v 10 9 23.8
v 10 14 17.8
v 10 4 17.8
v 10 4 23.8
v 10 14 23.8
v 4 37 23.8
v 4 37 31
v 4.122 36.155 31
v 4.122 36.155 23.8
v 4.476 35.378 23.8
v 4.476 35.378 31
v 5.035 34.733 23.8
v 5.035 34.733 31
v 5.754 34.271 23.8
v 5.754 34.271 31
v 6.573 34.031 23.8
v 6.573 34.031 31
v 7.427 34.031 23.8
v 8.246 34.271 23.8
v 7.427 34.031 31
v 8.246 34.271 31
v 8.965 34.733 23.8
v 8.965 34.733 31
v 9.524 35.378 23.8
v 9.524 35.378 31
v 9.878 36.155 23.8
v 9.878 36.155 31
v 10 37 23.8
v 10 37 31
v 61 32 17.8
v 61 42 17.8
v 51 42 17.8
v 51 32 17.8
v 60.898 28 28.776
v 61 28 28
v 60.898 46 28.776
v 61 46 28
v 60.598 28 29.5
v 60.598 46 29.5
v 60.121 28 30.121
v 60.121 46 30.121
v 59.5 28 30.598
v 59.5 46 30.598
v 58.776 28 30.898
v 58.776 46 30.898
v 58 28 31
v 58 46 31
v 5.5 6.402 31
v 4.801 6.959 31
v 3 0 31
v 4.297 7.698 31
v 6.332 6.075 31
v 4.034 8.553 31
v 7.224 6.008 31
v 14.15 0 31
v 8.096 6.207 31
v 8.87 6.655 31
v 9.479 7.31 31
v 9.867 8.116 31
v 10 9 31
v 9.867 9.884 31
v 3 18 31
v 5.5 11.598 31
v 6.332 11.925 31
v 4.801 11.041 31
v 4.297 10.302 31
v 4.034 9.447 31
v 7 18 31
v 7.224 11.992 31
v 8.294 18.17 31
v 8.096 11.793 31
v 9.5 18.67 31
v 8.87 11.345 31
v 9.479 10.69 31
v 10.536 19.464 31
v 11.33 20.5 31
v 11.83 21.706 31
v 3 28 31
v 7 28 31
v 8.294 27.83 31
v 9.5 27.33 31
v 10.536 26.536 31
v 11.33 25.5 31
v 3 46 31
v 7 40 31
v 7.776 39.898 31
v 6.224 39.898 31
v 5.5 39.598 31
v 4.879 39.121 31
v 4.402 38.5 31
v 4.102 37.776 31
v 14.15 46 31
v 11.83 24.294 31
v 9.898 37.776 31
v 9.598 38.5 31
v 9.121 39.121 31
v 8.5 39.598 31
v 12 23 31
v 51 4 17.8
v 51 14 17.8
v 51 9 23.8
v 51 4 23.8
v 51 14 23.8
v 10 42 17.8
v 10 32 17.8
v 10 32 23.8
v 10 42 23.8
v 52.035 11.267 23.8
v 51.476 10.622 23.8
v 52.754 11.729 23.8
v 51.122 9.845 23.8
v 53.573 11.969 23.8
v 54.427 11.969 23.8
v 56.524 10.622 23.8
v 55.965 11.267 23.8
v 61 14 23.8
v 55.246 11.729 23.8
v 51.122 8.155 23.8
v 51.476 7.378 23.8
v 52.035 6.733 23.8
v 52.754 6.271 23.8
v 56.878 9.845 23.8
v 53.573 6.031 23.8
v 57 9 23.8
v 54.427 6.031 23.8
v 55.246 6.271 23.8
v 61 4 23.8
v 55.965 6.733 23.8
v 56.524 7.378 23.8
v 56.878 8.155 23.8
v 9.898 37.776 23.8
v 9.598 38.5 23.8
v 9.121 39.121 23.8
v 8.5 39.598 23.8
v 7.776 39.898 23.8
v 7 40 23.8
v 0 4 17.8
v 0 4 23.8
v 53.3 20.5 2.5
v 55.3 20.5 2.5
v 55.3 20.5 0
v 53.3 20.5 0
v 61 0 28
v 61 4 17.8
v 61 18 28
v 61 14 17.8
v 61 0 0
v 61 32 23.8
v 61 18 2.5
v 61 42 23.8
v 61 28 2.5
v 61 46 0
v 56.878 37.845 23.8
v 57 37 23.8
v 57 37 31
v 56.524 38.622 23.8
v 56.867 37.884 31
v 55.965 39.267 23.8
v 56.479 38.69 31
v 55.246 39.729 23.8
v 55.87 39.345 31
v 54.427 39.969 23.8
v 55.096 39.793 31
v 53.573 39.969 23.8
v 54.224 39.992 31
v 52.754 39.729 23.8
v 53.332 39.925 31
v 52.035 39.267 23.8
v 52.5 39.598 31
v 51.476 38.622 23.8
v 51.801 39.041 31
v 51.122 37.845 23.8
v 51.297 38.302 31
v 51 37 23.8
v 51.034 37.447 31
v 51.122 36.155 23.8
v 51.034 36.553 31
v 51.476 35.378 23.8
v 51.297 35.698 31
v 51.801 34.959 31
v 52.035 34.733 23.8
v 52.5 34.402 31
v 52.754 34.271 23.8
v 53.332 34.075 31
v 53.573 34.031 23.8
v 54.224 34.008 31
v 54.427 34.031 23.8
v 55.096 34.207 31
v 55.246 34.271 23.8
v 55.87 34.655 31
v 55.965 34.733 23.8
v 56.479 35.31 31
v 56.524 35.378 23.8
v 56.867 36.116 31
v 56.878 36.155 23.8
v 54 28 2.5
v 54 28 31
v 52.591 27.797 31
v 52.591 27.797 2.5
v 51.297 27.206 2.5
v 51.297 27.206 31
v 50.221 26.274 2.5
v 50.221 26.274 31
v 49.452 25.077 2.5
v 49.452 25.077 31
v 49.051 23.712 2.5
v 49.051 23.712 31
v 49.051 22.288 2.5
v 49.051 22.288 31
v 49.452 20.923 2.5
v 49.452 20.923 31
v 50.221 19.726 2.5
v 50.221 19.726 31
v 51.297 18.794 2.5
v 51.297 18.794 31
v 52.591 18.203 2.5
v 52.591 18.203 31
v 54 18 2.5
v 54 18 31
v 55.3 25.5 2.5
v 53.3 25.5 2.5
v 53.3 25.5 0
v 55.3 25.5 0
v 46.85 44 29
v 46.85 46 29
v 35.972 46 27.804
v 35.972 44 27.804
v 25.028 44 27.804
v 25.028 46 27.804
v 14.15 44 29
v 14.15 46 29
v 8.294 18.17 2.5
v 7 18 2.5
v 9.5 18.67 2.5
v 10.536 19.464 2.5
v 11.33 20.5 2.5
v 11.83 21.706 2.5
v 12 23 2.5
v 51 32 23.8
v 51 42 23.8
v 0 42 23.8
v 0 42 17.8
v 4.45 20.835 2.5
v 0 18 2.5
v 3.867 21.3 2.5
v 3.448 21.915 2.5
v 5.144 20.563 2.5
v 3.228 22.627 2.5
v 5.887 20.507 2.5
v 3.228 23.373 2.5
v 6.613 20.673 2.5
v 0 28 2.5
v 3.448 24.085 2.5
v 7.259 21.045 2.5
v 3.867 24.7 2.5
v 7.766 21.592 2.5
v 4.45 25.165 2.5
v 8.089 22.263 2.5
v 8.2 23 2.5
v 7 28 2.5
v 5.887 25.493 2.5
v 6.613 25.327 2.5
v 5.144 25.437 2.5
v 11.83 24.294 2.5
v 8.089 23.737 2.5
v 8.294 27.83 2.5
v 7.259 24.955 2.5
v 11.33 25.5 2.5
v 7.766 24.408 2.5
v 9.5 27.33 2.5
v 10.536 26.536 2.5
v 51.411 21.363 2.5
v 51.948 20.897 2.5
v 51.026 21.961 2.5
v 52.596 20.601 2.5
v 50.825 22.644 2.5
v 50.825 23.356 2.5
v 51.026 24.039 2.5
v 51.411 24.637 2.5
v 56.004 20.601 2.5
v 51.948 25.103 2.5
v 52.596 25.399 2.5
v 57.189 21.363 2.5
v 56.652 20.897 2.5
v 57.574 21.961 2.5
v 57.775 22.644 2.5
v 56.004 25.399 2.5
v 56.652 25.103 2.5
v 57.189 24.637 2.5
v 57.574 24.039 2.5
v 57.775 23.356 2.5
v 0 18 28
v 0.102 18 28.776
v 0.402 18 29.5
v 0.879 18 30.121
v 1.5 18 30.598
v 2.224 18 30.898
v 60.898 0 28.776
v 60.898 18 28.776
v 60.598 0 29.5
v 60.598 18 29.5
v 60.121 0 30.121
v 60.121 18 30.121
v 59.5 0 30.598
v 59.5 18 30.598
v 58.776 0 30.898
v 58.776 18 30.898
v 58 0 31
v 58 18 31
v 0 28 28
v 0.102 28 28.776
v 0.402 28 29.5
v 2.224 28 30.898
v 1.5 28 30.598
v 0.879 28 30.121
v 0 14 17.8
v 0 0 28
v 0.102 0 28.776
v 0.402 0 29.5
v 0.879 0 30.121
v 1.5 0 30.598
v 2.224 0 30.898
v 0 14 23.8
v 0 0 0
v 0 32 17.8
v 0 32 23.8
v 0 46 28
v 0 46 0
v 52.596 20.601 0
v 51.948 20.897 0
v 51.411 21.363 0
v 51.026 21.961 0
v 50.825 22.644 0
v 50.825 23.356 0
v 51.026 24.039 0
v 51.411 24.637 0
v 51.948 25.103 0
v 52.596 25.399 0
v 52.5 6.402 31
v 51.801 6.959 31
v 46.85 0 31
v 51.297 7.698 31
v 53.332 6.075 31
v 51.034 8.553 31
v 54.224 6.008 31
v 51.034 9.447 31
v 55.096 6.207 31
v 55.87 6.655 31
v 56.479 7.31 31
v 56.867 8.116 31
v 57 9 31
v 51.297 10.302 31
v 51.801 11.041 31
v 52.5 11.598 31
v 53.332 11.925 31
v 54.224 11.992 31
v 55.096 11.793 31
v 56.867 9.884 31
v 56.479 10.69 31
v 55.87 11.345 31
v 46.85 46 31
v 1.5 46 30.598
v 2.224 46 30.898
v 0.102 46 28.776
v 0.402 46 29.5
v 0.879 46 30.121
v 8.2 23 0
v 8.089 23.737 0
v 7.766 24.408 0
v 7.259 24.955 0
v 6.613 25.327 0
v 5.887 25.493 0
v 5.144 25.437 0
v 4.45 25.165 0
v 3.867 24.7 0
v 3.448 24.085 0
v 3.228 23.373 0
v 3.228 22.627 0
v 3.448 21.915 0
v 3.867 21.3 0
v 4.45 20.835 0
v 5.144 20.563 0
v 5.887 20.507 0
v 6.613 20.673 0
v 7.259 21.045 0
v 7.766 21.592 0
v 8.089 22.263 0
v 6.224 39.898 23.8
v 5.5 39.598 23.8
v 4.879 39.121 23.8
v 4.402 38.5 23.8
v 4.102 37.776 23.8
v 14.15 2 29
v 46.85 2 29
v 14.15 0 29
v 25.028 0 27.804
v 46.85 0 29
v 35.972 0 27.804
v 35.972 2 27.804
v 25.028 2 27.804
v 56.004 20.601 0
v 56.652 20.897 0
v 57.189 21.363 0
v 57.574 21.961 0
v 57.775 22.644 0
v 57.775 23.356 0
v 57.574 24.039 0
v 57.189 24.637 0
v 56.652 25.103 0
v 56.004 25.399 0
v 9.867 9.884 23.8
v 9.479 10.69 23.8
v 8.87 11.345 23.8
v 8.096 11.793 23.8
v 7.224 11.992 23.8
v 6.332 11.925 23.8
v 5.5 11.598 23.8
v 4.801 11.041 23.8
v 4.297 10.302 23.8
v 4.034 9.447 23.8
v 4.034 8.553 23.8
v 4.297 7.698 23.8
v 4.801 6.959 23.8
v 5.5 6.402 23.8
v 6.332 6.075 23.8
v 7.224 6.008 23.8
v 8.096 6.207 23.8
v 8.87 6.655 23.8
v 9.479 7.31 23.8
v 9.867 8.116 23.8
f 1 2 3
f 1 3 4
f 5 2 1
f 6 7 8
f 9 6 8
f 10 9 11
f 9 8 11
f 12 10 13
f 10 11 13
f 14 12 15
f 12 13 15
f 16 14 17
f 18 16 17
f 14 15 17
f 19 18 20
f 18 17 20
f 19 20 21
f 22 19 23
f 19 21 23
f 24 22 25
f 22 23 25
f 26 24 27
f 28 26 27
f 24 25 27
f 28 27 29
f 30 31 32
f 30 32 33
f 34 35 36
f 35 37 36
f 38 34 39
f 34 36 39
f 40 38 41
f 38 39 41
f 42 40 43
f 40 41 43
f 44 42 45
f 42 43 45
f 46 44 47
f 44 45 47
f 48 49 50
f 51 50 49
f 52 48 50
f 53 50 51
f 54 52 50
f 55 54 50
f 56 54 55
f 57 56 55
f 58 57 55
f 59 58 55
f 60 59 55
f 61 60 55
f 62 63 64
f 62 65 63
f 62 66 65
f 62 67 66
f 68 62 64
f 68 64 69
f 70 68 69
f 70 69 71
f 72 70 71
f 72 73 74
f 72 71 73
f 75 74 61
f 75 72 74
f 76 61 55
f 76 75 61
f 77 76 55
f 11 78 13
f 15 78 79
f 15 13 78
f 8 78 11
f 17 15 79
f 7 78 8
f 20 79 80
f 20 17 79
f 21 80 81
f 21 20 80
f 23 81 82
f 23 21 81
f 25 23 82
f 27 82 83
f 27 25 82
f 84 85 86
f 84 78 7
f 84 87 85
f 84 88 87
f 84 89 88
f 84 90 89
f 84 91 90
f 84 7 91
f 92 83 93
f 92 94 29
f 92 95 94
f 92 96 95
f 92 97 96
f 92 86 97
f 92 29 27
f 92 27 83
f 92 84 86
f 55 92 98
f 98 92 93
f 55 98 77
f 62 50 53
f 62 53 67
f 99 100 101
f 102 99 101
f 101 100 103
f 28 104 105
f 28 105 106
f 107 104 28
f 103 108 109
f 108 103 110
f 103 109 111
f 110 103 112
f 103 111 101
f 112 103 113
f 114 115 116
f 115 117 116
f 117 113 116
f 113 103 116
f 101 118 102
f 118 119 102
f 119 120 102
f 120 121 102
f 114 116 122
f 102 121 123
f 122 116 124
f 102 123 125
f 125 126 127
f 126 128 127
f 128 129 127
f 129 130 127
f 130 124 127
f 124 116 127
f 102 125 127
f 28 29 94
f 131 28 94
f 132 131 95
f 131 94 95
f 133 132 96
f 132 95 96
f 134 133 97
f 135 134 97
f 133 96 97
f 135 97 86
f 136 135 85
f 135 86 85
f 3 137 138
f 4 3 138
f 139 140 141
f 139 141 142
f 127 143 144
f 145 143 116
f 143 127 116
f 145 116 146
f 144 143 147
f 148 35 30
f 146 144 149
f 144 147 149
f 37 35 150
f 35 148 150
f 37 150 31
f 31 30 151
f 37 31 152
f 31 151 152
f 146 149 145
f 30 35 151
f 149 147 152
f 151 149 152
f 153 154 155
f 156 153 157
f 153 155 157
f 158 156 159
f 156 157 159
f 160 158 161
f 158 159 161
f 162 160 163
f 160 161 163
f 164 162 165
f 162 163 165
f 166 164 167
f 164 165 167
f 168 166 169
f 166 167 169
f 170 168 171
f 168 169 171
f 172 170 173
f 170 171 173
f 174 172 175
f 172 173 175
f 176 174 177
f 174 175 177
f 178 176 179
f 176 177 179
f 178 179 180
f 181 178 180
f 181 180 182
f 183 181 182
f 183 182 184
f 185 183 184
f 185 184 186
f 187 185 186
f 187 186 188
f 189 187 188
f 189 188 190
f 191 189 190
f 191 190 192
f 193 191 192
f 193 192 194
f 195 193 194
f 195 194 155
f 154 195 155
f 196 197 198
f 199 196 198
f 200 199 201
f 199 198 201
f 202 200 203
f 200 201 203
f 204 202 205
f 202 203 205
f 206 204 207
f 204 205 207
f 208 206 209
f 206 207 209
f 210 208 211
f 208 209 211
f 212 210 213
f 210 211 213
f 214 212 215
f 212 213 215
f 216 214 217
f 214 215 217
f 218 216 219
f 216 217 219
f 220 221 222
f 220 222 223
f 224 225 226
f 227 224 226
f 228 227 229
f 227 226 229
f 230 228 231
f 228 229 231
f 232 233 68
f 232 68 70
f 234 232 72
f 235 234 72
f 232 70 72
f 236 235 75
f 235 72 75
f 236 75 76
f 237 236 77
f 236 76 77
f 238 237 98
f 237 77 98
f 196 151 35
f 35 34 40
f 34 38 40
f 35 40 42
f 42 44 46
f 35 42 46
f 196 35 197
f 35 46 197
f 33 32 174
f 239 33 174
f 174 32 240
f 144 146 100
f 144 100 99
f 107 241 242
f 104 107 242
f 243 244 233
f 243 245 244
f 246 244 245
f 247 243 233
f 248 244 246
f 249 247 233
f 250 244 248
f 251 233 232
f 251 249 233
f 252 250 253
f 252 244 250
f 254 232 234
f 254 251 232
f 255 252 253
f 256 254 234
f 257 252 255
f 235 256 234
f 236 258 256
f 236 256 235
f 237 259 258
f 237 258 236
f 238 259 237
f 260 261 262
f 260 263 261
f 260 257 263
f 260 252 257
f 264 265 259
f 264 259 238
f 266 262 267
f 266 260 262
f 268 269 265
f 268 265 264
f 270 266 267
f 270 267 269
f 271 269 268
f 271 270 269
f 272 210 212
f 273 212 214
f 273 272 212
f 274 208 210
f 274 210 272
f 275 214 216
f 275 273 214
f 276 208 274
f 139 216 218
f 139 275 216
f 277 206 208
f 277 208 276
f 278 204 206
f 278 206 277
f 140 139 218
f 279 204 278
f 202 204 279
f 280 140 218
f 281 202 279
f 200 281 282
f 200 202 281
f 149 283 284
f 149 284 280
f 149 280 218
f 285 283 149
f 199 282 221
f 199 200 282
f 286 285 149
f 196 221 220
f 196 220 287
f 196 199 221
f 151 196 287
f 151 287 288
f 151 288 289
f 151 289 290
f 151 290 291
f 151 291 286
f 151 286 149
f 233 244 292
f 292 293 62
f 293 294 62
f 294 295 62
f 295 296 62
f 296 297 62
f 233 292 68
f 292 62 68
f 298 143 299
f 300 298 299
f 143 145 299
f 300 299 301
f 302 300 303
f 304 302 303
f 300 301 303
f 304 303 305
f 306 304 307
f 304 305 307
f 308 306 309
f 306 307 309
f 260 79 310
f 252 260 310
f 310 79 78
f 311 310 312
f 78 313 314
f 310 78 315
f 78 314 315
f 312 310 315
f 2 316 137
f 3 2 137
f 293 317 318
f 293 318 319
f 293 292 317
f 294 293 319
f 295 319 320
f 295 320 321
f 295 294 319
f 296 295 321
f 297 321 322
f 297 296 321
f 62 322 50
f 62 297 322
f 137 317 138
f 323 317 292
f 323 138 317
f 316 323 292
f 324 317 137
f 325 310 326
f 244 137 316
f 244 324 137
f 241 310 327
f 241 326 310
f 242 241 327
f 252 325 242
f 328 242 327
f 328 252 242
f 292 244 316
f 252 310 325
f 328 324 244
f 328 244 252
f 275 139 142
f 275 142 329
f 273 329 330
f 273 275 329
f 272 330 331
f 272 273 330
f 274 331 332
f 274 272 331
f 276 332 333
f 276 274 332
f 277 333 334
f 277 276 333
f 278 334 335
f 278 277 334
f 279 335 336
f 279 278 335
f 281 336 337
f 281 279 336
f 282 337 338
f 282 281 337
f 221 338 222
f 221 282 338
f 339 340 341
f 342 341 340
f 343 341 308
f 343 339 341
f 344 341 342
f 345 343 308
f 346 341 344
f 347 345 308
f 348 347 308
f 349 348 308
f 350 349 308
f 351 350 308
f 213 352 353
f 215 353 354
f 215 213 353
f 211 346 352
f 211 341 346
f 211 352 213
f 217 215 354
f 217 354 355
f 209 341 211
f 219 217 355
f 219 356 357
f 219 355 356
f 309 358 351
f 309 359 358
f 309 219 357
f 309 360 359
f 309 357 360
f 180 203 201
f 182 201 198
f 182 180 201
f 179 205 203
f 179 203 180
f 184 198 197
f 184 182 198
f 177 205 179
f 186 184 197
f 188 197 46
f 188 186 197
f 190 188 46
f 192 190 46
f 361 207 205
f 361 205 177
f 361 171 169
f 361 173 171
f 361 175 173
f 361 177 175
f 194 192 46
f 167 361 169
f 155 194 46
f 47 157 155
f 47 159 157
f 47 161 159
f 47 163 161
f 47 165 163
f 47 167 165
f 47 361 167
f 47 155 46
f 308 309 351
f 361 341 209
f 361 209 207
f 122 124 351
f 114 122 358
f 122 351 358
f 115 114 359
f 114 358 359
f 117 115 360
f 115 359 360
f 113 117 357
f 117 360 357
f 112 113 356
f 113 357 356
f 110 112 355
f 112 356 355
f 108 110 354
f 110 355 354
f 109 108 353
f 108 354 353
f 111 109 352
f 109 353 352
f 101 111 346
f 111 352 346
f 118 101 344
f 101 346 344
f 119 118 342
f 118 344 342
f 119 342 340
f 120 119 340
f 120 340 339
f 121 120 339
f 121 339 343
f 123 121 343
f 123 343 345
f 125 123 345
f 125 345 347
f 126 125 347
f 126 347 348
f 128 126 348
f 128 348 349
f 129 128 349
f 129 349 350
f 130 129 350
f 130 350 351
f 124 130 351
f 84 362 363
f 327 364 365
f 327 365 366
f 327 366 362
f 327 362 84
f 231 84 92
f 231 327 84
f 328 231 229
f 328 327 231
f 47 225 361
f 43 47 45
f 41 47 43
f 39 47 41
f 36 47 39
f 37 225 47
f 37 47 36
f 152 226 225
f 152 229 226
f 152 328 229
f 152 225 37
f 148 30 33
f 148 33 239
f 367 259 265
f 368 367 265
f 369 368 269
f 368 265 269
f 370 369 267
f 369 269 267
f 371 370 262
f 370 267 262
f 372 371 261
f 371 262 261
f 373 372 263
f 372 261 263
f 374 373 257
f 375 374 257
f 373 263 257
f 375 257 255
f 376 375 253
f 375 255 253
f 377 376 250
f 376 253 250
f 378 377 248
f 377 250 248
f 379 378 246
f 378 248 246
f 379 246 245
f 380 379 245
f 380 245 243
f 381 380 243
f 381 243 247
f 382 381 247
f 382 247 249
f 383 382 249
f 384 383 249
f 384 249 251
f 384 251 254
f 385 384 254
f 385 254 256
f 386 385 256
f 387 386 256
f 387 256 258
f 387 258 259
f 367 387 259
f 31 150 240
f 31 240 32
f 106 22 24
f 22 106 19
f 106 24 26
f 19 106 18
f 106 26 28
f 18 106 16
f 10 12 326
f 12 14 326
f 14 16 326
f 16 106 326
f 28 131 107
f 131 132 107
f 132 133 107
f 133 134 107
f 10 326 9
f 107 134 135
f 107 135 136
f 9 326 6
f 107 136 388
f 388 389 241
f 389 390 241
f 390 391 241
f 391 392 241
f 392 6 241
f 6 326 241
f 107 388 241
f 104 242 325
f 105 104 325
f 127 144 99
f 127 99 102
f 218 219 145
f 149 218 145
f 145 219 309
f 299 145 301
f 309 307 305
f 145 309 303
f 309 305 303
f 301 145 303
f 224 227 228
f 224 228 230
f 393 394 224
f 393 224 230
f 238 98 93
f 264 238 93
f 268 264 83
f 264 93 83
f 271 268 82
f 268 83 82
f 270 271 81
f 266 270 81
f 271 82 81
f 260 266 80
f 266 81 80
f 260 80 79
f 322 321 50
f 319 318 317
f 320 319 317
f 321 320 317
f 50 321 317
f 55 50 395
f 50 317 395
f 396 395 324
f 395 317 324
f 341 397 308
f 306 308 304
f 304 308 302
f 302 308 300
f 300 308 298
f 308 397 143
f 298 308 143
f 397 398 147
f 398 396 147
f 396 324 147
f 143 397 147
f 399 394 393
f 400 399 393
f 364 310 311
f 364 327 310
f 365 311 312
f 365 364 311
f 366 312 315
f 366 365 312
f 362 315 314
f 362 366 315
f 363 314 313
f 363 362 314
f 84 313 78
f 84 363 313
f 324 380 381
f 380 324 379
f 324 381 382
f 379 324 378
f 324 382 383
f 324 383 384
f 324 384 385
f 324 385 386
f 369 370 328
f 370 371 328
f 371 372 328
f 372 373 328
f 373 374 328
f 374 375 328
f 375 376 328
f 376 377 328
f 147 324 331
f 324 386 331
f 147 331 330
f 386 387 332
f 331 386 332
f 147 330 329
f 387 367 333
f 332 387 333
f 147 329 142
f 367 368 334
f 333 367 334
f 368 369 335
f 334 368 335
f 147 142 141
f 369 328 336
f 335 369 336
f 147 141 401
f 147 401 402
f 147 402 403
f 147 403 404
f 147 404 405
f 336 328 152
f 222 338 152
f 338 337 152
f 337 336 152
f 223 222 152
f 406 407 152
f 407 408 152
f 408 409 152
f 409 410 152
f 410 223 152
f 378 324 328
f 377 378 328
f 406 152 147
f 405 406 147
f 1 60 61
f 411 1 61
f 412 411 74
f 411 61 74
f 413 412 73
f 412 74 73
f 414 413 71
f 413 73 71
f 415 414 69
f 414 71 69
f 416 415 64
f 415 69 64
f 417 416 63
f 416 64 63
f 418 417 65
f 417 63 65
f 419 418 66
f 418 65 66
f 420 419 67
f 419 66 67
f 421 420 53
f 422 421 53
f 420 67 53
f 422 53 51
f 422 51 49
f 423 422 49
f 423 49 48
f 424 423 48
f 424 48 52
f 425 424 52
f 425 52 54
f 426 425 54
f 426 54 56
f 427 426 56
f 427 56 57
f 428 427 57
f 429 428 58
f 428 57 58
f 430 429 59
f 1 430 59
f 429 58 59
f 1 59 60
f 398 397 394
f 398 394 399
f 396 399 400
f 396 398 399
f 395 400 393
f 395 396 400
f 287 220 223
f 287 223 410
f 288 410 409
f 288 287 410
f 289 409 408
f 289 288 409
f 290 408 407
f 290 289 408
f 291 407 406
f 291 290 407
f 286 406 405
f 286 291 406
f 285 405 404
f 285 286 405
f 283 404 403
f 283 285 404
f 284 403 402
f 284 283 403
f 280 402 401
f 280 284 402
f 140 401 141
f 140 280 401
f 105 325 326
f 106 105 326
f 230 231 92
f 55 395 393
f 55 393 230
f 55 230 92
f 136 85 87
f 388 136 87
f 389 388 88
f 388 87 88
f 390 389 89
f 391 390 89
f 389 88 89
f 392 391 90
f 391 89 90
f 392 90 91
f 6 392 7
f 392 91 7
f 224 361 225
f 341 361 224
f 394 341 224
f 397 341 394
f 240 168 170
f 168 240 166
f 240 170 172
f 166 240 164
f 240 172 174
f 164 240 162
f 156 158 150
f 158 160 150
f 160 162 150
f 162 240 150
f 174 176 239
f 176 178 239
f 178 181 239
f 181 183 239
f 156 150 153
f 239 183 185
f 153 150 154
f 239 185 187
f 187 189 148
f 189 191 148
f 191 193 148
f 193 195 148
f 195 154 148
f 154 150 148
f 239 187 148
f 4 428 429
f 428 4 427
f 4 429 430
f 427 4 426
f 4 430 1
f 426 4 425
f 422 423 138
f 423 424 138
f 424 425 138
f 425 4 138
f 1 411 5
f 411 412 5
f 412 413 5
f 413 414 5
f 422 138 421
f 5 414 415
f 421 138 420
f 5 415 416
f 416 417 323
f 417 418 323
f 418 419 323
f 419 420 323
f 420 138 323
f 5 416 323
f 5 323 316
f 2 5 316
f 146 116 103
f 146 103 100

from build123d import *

# Parameters (mm, degrees)
SKETCH_1_W          = 61
SKETCH_1_H          = 46
EXTRUDE_1_DEPTH     = 31
CUT_EXTRUDE_1_DEPTH = 28.5
SKETCH_3_R          = 2.5
CUT_EXTRUDE_2_DEPTH = 28.5
CUT_EXTRUDE_3_DEPTH = 28.5
CUT_EXTRUDE_4_DEPTH = 68.5
CUT_EXTRUDE_5_DEPTH = 2
CUT_EXTRUDE_6_DEPTH = 2
SKETCH_8_R          = 3
CUT_EXTRUDE_7_DEPTH = 7.2
CUT_EXTRUDE_8_DEPTH = 10
CUT_EXTRUDE_9_DEPTH = 10
FILLET_1_R          = 3


with BuildPart() as part:
    # 草图1 → 凸台-拉伸1 (new body)
    with BuildSketch(Plane.XY):
        with Locations((30.5, 23)):
            Rectangle(SKETCH_1_W, SKETCH_1_H)
    extrude(amount=EXTRUDE_1_DEPTH)

    # 草图2 → 切除-拉伸1 (cut)
    with BuildSketch(Plane.XY.offset(31)):
        with BuildLine():
            ThreePointArc((7, 18), (10.535533906, 19.464466094), (12, 23))
            ThreePointArc((12, 23), (10.535533906, 26.535533906), (7, 28))
            Line((7, 28), (0, 28))
            Line((0, 28), (0, 18))
            Line((0, 18), (7, 18))
        make_face()
        with BuildLine():
            Line((61, 18), (61, 28))
            Line((61, 28), (54, 28))
            ThreePointArc((54, 28), (49, 23), (54, 18))
            Line((54, 18), (61, 18))
        make_face()
    extrude(amount=-CUT_EXTRUDE_1_DEPTH, mode=Mode.SUBTRACT)

    # 草图3 → 切除-拉伸2 (cut)
    with BuildSketch(Plane.XY.offset(2.5)):
        with Locations((5.7, 23)):
            Circle(SKETCH_3_R)
    extrude(amount=-CUT_EXTRUDE_2_DEPTH, mode=Mode.SUBTRACT)

    # 草图4 → 切除-拉伸3 (cut)
    with BuildSketch(Plane.XY.offset(2.5)):
        with BuildLine():
            Line((53.3, 25.5), (55.3, 25.5))
            ThreePointArc((55.3, 25.5), (57.8, 23), (55.3, 20.5))
            Line((55.3, 20.5), (53.3, 20.5))
            ThreePointArc((53.3, 20.5), (50.8, 23), (53.3, 25.5))
        make_face()
    extrude(amount=-CUT_EXTRUDE_3_DEPTH, mode=Mode.SUBTRACT)

    # 草图5 → 切除-拉伸4 (cut)
    with BuildSketch(Plane.XZ):
        Polygon((30.5, 31), (46.85, 31), (46.85, 29), (14.15, 29), (14.15, 31), align=None)
    extrude(amount=-CUT_EXTRUDE_4_DEPTH, mode=Mode.SUBTRACT)

    # 草图6 → 切除-拉伸5 (cut)
    with BuildSketch(Plane.XZ):
        with BuildLine():
            Line((14.15, 29), (46.85, 29))
            ThreePointArc((46.85, 29), (30.5, 27.654333407), (14.15, 29))
        make_face()
    extrude(amount=-CUT_EXTRUDE_5_DEPTH, mode=Mode.SUBTRACT)

    # 草图7 → 切除-拉伸6 (cut)
    with BuildSketch(Plane(origin=(0, 46, 0), x_dir=(1, 0, 0), z_dir=(0, 1, 0))):
        with BuildLine():
            Line((14.15, -29), (46.85, -29))
            ThreePointArc((46.85, -29), (30.5, -27.654333407), (14.15, -29))
        make_face()
    extrude(amount=-CUT_EXTRUDE_6_DEPTH, mode=Mode.SUBTRACT)

    # 草图8 → 切除-拉伸7 (cut)
    with BuildSketch(Plane.XY.offset(31)):
        with BuildLine():
            ThreePointArc((10, 37), (9.121320344, 39.121320344), (7, 40))
            Line((7, 40), (7, 37))
            Line((7, 37), (4, 37))
            ThreePointArc((4, 37), (7, 34), (10, 37))
        make_face()
        with BuildLine():
            Line((7, 37), (7, 40))
            ThreePointArc((7, 40), (4.878679656, 39.121320344), (4, 37))
            Line((4, 37), (7, 37))
        make_face()
        with Locations((7, 9)):
            Circle(SKETCH_8_R)
        with Locations((54, 9)):
            Circle(SKETCH_8_R)
        with Locations((54, 37)):
            Circle(SKETCH_8_R)
    extrude(amount=-CUT_EXTRUDE_7_DEPTH, mode=Mode.SUBTRACT)

    # 草图9 → 切除-拉伸8 (cut)
    with BuildSketch(Plane.ZY):
        Polygon((23.8, 32), (23.8, 37), (23.8, 42), (17.8, 42), (17.8, 41.5), (17.8, 32), align=None)
        Polygon((23.8, 4), (23.8, 14), (17.8, 14), (17.8, 4.5), (17.8, 4), align=None)
    extrude(amount=-CUT_EXTRUDE_8_DEPTH, mode=Mode.SUBTRACT)

    # 草图10 → 切除-拉伸9 (cut)
    with BuildSketch(Plane(origin=(61, 0, 0), x_dir=(0, 0, -1), z_dir=(1, 0, 0))):
        Polygon((-23.8, 4), (-23.8, 9), (-23.8, 14), (-17.8, 14), (-17.8, 4), align=None)
        Polygon((-23.8, 42), (-17.8, 42), (-17.8, 32), (-23.8, 32), (-23.8, 37), align=None)
    extrude(amount=-CUT_EXTRUDE_9_DEPTH, mode=Mode.SUBTRACT)

    # 圆角1
    fillet_1_edges = [part.edges().sort_by_distance(p)[0] for p in [
        (61, 9, 31),
        (0, 9, 31),
        (61, 37, 31),
        (0, 37, 31),
    ]]
    fillet(fillet_1_edges, radius=FILLET_1_R)


solid = part.part
